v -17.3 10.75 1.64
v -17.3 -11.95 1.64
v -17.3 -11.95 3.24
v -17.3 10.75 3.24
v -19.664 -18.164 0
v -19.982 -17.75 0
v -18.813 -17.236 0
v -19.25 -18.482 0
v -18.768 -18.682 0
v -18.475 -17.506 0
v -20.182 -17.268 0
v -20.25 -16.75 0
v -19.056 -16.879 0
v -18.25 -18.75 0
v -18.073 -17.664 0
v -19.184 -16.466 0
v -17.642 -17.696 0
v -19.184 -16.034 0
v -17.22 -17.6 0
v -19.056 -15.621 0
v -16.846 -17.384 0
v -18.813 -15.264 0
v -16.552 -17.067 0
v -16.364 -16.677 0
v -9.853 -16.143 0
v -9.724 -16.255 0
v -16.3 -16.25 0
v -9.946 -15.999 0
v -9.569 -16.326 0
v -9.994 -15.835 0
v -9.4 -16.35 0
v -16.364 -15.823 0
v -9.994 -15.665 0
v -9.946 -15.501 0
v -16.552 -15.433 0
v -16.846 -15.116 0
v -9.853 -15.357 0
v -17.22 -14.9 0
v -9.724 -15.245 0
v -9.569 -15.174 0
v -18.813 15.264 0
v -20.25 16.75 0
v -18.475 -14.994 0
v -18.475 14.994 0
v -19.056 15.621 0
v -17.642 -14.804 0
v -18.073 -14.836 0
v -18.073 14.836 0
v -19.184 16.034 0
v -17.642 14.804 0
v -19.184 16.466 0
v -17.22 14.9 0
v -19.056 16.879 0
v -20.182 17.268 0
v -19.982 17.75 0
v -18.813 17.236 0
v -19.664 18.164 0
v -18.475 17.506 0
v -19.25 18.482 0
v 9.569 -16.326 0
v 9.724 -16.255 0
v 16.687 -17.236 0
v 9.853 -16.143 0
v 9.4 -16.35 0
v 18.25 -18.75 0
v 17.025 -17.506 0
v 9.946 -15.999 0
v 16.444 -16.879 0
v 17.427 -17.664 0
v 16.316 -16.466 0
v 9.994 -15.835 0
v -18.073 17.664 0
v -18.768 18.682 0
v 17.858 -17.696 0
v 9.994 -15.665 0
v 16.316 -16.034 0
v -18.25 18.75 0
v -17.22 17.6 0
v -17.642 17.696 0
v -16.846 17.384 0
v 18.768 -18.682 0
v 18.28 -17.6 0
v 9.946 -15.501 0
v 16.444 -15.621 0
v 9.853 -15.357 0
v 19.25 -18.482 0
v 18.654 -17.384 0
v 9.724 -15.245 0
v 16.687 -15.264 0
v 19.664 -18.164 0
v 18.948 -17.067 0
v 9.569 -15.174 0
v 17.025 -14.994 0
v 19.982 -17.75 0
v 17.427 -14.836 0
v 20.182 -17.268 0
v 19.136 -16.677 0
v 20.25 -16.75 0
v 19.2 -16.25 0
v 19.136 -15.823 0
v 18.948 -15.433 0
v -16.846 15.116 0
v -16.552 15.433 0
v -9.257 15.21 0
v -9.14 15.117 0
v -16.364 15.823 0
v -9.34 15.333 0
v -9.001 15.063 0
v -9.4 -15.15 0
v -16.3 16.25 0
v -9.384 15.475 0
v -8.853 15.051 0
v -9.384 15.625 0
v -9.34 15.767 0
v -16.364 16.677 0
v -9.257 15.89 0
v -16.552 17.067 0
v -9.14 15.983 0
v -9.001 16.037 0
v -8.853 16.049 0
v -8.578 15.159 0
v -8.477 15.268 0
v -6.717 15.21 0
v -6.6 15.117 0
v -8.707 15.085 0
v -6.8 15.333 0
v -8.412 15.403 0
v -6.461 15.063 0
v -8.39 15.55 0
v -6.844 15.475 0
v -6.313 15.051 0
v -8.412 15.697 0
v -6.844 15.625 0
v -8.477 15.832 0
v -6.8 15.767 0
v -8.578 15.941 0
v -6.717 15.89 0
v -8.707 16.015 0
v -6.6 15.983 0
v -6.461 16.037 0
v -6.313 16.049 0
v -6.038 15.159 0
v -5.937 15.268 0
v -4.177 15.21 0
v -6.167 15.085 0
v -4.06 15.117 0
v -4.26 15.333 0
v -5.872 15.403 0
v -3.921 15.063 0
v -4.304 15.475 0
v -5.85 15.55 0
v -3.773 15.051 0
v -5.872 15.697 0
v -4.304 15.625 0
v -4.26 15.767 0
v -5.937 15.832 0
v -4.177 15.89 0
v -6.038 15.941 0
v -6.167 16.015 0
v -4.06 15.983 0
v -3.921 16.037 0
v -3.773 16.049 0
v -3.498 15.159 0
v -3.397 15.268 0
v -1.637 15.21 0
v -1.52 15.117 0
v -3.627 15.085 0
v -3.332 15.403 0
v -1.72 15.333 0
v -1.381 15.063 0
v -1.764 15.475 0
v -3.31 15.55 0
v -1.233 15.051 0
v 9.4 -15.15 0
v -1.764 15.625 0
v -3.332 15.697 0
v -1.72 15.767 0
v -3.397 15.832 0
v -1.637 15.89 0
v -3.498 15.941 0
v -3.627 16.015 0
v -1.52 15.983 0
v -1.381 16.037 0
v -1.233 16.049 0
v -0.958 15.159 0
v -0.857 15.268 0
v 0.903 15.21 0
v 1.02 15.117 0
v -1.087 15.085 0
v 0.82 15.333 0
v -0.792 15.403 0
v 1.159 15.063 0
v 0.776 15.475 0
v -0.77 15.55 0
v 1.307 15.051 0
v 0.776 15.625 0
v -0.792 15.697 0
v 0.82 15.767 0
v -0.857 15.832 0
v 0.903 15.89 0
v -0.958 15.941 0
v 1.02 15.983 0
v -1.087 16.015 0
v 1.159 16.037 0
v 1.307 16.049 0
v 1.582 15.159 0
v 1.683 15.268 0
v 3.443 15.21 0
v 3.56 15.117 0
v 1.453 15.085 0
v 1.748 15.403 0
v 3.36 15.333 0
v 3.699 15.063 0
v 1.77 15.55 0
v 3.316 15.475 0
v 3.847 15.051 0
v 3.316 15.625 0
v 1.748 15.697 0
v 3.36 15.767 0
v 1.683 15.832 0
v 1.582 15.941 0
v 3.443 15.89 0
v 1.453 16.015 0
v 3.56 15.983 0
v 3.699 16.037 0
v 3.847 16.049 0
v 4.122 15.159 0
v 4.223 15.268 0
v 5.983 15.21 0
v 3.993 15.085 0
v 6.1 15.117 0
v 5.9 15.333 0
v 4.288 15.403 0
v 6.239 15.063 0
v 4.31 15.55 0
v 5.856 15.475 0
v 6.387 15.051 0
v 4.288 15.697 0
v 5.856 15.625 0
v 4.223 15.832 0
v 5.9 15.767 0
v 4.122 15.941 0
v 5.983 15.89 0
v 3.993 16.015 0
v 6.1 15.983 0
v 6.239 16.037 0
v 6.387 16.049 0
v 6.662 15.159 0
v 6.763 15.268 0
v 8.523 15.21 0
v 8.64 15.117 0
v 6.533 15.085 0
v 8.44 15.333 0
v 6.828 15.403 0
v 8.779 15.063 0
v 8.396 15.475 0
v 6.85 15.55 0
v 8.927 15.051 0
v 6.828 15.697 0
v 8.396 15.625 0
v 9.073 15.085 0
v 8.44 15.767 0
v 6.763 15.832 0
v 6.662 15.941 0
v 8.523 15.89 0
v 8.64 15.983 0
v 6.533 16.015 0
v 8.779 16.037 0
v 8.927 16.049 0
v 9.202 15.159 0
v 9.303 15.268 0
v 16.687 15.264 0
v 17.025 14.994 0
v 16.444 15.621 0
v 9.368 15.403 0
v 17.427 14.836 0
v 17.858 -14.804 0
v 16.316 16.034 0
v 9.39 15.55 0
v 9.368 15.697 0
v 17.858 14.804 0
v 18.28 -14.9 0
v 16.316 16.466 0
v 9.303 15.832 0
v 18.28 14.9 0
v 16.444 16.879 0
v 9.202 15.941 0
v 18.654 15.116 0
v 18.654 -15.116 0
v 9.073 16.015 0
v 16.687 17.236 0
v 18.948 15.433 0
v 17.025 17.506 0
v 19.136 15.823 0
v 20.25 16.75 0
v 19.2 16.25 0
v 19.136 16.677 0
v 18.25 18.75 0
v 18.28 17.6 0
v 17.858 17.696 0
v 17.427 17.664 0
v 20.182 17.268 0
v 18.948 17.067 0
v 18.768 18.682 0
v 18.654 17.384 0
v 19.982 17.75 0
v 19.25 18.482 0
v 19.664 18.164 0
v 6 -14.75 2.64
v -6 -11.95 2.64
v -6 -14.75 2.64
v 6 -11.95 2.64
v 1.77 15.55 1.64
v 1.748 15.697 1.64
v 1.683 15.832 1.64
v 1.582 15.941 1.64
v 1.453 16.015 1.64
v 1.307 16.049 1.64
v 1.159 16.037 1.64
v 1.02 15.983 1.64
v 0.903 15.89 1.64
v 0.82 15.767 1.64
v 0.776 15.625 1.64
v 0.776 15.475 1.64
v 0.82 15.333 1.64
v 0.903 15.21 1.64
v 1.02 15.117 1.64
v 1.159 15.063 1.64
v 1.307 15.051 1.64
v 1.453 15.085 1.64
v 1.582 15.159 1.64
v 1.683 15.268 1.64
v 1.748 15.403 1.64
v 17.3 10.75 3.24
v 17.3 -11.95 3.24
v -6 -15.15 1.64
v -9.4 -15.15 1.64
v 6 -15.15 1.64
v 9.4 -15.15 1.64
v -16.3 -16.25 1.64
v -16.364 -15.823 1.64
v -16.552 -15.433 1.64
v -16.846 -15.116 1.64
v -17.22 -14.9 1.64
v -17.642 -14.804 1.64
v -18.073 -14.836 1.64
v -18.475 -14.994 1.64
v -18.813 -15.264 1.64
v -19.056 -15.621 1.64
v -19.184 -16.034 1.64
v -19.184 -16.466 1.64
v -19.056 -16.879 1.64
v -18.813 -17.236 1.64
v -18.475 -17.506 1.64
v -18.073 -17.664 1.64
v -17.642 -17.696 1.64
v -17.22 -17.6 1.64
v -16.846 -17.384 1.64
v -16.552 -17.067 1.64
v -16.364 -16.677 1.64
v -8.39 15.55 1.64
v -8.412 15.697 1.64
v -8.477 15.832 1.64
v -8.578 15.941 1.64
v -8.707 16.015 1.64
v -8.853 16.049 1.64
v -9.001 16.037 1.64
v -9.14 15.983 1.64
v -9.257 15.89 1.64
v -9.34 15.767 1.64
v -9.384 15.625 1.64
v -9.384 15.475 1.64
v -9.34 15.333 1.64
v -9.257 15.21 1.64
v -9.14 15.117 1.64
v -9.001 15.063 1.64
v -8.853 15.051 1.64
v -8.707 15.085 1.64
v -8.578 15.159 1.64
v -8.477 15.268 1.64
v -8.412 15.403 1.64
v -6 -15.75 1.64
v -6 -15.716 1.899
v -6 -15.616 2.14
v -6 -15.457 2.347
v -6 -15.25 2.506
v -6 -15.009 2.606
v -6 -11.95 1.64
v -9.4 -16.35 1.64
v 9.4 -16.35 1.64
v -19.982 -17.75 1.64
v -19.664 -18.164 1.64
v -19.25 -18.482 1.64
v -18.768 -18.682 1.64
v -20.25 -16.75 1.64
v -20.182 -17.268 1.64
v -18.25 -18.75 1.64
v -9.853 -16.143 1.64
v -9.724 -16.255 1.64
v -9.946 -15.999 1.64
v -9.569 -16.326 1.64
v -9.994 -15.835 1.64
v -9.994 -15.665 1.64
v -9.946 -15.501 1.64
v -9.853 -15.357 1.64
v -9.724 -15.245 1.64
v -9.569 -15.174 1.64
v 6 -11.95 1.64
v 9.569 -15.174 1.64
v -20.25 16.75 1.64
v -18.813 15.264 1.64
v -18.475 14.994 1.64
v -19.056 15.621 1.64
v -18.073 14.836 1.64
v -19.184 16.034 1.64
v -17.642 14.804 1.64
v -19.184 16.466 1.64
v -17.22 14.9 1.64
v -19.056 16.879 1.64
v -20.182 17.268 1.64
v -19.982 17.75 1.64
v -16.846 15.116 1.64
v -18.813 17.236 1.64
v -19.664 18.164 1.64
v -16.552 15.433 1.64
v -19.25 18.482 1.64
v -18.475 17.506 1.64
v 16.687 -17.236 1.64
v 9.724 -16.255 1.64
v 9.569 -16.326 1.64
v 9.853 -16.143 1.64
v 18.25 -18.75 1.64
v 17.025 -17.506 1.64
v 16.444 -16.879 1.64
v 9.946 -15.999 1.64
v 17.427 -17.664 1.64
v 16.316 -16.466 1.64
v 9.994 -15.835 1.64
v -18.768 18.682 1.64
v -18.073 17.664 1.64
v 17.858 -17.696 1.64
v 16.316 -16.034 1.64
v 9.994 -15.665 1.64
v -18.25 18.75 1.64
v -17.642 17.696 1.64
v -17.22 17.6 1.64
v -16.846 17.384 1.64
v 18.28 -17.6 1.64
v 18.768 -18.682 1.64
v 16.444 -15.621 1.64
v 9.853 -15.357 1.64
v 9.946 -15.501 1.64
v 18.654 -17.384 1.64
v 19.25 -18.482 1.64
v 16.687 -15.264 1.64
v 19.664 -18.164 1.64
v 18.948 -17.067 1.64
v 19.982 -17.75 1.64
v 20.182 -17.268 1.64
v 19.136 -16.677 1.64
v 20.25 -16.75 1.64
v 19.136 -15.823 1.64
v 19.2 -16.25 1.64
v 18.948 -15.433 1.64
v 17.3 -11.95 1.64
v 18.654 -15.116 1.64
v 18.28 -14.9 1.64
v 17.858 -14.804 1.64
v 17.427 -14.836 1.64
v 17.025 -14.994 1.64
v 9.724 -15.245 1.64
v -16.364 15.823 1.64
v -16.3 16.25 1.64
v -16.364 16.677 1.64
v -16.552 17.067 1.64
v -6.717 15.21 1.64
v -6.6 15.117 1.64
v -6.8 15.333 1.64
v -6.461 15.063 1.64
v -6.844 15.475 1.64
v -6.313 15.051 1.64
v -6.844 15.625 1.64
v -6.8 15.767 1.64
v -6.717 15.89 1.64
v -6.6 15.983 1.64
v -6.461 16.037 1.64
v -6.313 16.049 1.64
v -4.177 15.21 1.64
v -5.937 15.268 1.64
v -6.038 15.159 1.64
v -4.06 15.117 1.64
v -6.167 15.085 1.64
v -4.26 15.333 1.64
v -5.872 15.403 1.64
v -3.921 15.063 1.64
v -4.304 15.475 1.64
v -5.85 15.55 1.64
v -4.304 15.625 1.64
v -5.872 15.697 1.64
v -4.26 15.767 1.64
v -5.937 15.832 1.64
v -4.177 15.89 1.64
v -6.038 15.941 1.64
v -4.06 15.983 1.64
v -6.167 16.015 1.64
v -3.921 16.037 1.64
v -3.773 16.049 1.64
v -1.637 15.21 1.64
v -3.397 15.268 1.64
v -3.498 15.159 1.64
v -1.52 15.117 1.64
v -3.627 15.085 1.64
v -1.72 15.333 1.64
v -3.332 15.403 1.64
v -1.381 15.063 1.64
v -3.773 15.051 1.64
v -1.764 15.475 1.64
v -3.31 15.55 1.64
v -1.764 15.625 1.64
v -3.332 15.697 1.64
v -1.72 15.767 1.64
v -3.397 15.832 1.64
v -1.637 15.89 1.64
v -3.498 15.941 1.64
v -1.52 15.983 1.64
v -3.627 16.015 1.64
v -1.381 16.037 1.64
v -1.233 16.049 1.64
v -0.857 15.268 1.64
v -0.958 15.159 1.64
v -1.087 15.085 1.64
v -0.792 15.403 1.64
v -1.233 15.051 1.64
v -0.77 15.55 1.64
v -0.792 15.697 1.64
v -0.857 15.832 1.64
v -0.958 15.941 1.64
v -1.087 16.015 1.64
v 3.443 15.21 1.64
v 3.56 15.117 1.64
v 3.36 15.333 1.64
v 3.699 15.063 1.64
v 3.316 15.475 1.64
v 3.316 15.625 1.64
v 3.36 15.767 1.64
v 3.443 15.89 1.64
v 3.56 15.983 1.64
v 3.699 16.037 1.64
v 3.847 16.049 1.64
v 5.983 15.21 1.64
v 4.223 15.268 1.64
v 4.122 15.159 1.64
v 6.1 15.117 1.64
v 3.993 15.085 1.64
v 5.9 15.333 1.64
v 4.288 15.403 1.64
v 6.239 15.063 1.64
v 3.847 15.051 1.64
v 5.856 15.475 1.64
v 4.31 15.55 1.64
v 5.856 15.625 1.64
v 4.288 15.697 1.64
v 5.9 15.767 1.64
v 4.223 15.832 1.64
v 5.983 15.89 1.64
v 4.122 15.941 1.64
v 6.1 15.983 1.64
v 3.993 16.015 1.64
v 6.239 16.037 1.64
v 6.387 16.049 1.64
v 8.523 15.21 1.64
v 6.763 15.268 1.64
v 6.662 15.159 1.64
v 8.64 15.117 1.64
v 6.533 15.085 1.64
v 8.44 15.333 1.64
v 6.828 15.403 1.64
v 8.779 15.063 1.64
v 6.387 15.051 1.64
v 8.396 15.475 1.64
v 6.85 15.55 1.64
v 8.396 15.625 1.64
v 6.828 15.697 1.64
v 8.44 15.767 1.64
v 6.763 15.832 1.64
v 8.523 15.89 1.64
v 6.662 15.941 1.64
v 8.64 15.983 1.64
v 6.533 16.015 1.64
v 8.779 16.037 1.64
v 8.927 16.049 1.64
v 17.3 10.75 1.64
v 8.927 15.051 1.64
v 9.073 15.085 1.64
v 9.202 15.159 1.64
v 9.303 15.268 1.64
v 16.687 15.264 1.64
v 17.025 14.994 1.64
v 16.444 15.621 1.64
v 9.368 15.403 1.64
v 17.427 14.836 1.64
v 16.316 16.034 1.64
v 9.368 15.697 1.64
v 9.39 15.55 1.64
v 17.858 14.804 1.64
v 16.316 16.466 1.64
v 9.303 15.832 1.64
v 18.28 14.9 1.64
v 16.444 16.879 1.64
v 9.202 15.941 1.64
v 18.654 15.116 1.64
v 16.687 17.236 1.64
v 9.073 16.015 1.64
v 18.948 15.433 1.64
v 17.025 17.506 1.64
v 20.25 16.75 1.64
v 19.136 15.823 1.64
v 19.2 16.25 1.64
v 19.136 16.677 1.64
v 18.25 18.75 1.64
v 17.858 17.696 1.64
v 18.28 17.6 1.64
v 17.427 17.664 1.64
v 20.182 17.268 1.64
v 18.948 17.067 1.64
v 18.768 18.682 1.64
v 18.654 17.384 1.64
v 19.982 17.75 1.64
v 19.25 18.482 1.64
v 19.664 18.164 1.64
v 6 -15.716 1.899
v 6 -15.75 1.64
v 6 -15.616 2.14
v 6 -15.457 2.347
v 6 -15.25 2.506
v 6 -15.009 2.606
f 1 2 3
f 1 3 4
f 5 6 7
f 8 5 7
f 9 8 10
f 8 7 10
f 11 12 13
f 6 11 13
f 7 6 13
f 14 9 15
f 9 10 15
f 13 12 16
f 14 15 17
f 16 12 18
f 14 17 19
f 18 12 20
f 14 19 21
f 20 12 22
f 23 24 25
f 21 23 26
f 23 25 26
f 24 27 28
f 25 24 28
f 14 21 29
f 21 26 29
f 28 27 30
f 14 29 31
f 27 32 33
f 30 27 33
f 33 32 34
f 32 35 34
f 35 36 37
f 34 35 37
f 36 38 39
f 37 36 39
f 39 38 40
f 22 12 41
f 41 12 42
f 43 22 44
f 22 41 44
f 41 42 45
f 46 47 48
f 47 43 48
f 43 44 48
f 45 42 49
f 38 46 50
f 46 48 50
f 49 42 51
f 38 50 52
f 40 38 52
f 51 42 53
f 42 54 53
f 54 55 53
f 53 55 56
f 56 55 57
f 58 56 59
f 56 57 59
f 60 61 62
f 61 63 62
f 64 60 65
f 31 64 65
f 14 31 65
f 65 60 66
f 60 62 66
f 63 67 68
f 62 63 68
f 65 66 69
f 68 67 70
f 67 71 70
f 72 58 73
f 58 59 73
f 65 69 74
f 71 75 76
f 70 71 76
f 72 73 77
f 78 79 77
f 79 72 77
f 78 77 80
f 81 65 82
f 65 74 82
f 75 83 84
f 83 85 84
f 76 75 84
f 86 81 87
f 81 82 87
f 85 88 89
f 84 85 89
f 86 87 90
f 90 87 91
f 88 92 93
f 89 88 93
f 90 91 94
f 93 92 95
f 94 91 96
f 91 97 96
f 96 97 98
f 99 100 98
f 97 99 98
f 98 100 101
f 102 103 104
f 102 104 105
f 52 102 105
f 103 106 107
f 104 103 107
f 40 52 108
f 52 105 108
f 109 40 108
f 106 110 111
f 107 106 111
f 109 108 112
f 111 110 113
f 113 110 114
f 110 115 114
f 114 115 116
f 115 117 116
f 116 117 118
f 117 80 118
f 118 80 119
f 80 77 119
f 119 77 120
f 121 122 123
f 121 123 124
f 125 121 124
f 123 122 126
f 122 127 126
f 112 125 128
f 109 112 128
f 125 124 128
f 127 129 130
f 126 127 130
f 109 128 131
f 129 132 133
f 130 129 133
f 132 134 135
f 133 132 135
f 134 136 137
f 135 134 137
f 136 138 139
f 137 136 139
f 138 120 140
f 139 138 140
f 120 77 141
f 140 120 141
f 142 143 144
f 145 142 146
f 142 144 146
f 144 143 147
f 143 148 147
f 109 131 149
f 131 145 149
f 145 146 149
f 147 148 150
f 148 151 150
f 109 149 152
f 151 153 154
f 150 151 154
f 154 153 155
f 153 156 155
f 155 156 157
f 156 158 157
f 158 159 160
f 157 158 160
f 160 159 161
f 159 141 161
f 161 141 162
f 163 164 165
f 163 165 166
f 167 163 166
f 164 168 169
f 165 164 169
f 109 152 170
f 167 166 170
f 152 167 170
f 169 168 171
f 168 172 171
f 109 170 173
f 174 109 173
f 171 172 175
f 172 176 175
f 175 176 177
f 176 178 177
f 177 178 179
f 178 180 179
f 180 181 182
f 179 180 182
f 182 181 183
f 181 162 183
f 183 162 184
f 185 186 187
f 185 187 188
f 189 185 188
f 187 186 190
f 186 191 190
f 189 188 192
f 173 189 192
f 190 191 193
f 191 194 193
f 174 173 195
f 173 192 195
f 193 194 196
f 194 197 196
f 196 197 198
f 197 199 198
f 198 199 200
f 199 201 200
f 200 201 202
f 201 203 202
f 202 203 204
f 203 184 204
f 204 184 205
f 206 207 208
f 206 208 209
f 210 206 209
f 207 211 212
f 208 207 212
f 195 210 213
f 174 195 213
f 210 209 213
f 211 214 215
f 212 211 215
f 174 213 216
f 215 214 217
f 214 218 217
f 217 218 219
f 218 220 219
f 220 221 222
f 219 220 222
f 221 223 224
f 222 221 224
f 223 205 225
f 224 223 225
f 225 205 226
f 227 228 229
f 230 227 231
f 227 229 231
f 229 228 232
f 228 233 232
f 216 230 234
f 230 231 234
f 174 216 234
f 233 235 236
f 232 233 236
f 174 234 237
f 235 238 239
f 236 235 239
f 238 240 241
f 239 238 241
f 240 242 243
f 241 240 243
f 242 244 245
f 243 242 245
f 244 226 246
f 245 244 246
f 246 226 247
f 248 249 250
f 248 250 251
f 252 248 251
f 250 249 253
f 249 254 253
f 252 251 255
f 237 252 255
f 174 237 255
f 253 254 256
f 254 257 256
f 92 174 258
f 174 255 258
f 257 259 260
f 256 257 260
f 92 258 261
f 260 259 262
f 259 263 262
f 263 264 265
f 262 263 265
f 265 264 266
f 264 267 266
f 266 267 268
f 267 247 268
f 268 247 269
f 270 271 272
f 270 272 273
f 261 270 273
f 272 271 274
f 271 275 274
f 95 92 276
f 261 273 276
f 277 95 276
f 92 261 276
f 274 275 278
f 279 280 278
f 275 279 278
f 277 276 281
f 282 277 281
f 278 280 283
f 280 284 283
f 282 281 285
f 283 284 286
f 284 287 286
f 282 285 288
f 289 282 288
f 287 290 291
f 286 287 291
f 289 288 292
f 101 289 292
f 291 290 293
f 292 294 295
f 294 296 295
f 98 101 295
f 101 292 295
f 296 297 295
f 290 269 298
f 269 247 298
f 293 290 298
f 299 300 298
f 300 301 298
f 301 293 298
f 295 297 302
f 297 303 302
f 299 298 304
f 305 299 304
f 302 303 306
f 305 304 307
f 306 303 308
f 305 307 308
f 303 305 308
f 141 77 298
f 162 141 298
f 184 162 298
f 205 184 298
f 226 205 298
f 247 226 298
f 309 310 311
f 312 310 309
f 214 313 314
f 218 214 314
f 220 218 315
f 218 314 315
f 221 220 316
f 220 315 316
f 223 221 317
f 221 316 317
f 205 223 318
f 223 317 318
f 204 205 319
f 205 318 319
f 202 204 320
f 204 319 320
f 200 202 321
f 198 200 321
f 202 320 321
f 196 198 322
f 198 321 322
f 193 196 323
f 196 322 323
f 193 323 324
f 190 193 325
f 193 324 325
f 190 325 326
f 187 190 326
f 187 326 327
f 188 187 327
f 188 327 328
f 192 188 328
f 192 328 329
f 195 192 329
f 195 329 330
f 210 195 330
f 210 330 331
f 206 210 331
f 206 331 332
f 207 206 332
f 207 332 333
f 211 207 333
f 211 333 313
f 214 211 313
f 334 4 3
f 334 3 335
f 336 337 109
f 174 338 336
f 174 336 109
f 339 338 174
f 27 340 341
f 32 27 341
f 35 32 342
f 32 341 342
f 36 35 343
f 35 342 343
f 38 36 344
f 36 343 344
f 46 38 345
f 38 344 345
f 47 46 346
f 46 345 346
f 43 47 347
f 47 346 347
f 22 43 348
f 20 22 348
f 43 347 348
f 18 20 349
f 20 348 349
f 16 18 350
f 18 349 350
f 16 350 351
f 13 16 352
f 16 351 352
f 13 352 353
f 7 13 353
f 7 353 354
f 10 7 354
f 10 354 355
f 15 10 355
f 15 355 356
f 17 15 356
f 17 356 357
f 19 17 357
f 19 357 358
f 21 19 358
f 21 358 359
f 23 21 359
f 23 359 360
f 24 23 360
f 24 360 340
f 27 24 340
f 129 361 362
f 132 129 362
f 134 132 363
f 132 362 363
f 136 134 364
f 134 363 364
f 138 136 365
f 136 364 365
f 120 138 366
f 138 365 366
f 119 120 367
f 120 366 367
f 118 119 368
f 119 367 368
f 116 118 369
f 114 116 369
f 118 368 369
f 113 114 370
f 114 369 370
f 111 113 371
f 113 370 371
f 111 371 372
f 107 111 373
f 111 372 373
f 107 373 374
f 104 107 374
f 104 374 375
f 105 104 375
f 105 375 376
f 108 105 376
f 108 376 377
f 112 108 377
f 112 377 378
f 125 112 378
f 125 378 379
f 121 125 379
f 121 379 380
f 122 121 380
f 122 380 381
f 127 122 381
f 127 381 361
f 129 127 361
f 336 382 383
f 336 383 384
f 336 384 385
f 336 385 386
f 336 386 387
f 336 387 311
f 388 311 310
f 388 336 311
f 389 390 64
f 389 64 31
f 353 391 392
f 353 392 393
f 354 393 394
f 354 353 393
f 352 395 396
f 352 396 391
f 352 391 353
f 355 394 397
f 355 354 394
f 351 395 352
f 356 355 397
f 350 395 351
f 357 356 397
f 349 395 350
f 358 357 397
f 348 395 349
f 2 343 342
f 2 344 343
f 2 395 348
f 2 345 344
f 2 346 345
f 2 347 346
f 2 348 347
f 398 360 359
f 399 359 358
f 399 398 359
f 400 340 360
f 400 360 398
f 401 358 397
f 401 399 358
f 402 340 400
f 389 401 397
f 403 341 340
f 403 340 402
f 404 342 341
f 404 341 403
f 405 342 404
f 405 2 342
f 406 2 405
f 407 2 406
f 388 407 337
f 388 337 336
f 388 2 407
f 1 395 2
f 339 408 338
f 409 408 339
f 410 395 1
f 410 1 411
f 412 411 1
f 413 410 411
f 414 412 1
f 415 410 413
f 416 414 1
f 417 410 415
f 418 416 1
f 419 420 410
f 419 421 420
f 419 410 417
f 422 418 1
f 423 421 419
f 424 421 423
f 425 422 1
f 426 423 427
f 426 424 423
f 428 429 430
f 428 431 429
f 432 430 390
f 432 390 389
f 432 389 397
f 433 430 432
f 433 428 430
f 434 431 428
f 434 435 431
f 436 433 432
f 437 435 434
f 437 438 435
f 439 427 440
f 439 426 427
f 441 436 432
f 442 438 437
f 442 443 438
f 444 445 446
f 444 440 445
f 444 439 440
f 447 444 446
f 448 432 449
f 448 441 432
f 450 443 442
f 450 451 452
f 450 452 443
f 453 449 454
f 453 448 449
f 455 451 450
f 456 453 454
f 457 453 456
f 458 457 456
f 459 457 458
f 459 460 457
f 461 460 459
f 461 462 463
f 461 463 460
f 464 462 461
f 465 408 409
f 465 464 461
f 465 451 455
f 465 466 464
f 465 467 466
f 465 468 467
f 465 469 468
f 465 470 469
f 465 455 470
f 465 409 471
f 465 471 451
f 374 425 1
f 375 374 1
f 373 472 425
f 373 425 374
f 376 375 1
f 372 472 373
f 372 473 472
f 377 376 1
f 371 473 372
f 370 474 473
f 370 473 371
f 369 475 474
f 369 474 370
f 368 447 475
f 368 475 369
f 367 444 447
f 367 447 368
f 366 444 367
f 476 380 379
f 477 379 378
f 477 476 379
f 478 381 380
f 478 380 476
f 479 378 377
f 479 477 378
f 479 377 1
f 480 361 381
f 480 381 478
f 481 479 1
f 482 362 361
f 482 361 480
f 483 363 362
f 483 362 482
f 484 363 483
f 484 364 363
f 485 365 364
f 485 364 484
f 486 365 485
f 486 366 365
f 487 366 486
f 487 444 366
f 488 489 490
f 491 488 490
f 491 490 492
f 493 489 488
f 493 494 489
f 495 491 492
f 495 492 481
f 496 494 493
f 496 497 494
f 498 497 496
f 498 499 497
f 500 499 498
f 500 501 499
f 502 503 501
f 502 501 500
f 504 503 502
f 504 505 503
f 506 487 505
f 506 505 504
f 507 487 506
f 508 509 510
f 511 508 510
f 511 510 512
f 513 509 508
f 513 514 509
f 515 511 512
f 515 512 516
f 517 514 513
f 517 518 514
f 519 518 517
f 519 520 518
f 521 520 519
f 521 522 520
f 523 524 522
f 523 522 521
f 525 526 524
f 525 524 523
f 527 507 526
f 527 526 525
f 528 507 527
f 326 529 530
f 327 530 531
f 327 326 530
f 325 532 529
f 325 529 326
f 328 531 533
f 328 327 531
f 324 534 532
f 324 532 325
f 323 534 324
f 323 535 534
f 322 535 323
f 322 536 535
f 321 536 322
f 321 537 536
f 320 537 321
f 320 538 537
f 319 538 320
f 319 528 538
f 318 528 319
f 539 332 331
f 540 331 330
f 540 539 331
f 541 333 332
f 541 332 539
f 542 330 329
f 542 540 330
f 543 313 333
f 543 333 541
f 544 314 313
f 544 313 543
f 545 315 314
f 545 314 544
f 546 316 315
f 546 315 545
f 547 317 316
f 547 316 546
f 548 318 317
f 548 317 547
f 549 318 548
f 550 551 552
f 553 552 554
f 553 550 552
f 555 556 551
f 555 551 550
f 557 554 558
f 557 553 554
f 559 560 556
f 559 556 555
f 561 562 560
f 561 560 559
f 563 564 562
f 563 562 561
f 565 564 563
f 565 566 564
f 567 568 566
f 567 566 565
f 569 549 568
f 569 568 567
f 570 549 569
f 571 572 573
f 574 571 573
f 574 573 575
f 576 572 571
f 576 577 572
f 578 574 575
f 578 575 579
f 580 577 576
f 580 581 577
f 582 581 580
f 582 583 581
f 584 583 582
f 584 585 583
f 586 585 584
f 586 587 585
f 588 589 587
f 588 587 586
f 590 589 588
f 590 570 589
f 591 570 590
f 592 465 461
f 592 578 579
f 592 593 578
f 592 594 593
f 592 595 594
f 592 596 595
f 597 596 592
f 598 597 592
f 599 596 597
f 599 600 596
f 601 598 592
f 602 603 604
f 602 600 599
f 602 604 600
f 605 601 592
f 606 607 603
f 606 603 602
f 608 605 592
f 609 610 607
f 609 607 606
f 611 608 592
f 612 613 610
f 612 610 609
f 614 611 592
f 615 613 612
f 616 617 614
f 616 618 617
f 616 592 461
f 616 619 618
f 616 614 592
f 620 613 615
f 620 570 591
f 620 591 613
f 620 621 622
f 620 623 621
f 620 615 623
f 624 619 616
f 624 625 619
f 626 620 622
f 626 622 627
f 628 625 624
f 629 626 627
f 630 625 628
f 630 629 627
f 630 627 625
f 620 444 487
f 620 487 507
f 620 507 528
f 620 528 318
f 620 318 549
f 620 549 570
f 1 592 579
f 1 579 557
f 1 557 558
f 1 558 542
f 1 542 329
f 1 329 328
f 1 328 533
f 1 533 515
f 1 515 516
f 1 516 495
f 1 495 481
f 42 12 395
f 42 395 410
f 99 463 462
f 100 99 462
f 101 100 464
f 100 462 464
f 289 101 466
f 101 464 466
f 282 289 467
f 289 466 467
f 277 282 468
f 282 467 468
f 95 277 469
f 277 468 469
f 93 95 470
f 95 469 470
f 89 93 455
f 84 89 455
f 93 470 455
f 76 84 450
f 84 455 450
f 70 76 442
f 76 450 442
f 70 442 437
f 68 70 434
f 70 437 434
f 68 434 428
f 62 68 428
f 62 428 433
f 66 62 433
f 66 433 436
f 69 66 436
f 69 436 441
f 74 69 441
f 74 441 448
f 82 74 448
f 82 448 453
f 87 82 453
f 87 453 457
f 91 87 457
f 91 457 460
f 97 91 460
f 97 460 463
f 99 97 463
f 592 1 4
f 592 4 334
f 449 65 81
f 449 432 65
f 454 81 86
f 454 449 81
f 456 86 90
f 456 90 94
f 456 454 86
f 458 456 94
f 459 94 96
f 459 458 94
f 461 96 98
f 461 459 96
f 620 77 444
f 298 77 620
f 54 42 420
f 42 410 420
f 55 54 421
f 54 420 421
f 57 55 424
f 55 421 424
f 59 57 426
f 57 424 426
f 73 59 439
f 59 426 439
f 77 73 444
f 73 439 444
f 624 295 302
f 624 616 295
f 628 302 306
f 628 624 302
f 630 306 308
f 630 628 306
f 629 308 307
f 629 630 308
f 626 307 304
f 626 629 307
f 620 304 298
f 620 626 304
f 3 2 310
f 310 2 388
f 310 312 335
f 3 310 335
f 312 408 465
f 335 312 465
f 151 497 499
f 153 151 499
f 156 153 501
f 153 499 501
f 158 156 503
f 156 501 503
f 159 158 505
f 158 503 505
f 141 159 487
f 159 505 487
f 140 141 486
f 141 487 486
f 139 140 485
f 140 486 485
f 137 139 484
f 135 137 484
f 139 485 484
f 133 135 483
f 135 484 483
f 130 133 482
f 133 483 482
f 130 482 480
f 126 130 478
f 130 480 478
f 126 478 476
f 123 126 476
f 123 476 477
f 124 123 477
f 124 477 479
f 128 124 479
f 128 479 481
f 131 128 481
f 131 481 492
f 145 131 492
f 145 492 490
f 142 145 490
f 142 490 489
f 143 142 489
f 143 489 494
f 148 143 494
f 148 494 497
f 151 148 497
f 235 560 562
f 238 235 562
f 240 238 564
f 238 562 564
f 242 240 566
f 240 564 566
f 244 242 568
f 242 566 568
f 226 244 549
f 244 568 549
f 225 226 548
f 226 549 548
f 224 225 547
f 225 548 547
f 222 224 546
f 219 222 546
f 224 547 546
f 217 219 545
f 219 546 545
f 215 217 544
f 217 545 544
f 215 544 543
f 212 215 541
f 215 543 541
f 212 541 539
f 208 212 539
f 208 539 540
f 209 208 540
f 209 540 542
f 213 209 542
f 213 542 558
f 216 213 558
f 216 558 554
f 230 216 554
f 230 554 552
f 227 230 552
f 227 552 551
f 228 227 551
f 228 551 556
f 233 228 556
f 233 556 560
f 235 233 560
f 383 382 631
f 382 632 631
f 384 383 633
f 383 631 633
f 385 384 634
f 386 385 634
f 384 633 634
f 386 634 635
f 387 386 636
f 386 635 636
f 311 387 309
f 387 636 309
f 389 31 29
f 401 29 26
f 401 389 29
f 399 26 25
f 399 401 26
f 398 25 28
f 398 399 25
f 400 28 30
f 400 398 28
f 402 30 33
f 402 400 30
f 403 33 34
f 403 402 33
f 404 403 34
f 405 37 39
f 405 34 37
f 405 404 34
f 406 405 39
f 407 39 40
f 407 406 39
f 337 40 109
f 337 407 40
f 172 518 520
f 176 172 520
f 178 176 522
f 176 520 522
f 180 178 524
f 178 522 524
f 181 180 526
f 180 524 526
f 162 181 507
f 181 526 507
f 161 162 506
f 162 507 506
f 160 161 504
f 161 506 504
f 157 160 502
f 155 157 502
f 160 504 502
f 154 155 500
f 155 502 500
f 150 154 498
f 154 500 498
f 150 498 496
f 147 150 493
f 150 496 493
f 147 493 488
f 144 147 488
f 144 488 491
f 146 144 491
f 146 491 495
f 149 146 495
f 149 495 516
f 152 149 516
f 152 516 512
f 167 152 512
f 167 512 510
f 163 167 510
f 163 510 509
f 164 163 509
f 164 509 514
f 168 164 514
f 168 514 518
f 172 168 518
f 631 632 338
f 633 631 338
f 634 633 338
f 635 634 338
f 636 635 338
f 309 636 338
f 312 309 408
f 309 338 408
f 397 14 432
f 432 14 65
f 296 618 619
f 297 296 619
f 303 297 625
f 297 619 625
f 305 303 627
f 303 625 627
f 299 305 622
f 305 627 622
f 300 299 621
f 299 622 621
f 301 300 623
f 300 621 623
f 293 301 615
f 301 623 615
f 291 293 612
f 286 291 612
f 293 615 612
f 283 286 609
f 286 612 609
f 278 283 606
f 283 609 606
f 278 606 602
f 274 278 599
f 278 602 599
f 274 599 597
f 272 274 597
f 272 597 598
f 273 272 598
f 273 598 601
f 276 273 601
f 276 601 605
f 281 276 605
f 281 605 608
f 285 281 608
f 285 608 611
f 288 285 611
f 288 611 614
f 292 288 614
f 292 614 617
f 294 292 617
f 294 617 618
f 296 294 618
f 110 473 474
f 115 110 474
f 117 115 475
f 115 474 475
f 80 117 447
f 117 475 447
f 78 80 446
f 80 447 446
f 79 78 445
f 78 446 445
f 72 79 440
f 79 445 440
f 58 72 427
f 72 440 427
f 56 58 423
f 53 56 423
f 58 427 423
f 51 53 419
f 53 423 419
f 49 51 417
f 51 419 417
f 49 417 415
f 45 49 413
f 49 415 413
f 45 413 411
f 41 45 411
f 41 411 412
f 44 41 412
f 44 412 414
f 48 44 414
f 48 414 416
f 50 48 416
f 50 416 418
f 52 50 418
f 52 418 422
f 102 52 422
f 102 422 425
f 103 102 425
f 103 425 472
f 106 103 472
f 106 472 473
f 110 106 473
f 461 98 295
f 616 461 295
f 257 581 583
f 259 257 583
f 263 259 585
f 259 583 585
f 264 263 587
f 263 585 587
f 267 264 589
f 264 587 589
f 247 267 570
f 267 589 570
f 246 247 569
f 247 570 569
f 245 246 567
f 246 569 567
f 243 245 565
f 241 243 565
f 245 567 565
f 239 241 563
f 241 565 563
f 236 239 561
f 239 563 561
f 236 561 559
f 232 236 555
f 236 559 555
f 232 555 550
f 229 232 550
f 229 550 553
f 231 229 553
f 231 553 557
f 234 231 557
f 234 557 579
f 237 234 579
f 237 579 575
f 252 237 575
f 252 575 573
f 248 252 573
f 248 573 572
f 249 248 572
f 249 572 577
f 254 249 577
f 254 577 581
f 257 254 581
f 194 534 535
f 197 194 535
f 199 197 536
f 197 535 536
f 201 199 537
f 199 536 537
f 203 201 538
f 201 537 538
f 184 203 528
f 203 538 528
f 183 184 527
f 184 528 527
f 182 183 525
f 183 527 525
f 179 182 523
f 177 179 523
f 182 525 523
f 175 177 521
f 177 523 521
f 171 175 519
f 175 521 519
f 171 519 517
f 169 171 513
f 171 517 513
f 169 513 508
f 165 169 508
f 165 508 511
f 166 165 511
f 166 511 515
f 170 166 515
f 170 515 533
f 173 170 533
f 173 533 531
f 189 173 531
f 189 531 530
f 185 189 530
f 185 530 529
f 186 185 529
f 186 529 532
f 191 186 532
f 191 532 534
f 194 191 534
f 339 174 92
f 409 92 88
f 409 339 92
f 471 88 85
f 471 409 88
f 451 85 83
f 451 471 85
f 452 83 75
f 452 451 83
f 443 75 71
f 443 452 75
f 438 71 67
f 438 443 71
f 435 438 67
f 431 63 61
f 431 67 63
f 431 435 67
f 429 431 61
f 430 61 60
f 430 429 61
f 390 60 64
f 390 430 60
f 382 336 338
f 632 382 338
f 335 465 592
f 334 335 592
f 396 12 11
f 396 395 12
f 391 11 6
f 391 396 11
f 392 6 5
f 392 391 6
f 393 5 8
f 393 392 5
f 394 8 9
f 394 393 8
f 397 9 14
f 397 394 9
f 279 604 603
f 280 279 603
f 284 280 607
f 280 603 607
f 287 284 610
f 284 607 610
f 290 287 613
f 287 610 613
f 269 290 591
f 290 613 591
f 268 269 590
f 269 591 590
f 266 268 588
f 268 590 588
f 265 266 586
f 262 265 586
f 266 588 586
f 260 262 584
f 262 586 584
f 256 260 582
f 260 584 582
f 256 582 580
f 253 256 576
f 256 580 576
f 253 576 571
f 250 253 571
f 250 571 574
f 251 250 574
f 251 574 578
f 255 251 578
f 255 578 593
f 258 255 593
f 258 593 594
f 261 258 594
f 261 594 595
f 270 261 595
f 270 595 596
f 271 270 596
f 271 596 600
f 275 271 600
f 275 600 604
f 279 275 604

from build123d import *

# Parameters (mm, degrees)
SKETCH1_W           = 40.5
SKETCH1_H           = 37.5
PCB_DEPTH           = 1.64
FILLET1_R           = 2
MOUNT_HOLE_REACH    = 29.646
SKETCH2_R           = 1.45
SLOT_REACH          = 29.646
CUT_EXTRUDE3_REACH  = 29.646
SKETCH4_R           = 0.5
SKETCH5_W           = 34.6
SKETCH5_H           = 22.7
OLED_GLASS_DEPTH    = 1.6
SKETCH6_W           = 12
SKETCH6_H           = 3.8
BOSS_EXTRUDE3_DEPTH = 1
FILLET2_R           = 1


with BuildPart() as part:
    # Sketch1 → PCB (new body)
    with BuildSketch(Plane.XY):
        Rectangle(SKETCH1_W, SKETCH1_H)
    extrude(amount=PCB_DEPTH)

    # Fillet1
    fillet1_edges = [part.edges().sort_by_distance(p)[0] for p in [
        (-20.25, 18.75, 0.82),
        (20.25, 18.75, 0.82),
        (20.25, -18.75, 0.82),
        (-20.25, -18.75, 0.82),
    ]]
    fillet(fillet1_edges, radius=FILLET1_R)

    # Sketch2 → mount hole (cut, up to next)
    with BuildSketch(Plane.XY.offset(1.64), mode=Mode.PRIVATE) as mount_hole_sk1:
        with Locations((-17.75, 16.25)):
            Circle(SKETCH2_R)
    mount_hole_tool1 = extrude(mount_hole_sk1.sketch, amount=-MOUNT_HOLE_REACH, mode=Mode.PRIVATE) & part.part
    # Sketch2 → mount hole (cut, up to next)
    with BuildSketch(Plane.XY.offset(1.64), mode=Mode.PRIVATE) as mount_hole_sk2:
        with Locations((17.75, 16.25)):
            Circle(SKETCH2_R)
    mount_hole_tool2 = extrude(mount_hole_sk2.sketch, amount=-MOUNT_HOLE_REACH, mode=Mode.PRIVATE) & part.part
    # Sketch2 → mount hole (cut, up to next)
    with BuildSketch(Plane.XY.offset(1.64), mode=Mode.PRIVATE) as mount_hole_sk3:
        with Locations((17.75, -16.25)):
            Circle(SKETCH2_R)
    mount_hole_tool3 = extrude(mount_hole_sk3.sketch, amount=-MOUNT_HOLE_REACH, mode=Mode.PRIVATE) & part.part
    # Sketch2 → mount hole (cut, up to next)
    with BuildSketch(Plane.XY.offset(1.64), mode=Mode.PRIVATE) as mount_hole_sk4:
        with Locations((-17.75, -16.25)):
            Circle(SKETCH2_R)
    mount_hole_tool4 = extrude(mount_hole_sk4.sketch, amount=-MOUNT_HOLE_REACH, mode=Mode.PRIVATE) & part.part
    add(mount_hole_tool1.solids().sort_by_distance((-17.75, 16.25, 1.64))[0], mode=Mode.SUBTRACT)
    add(mount_hole_tool2.solids().sort_by_distance((17.75, 16.25, 1.64))[0], mode=Mode.SUBTRACT)
    add(mount_hole_tool3.solids().sort_by_distance((17.75, -16.25, 1.64))[0], mode=Mode.SUBTRACT)
    add(mount_hole_tool4.solids().sort_by_distance((-17.75, -16.25, 1.64))[0], mode=Mode.SUBTRACT)

    # Sketch3 → slot (cut, up to next)
    with BuildSketch(Plane.XY.offset(1.64), mode=Mode.PRIVATE) as slot_sk1:
        with BuildLine():
            Line((-9.4, -15.15), (9.4, -15.15))
            ThreePointArc((9.4, -15.15), (10, -15.75), (9.4, -16.35))
            Line((9.4, -16.35), (-9.4, -16.35))
            ThreePointArc((-9.4, -16.35), (-10, -15.75), (-9.4, -15.15))
        make_face()
    slot_tool1 = extrude(slot_sk1.sketch, amount=-SLOT_REACH, mode=Mode.PRIVATE) & part.part
    add(slot_tool1.solids().sort_by_distance((0, -15.75, 1.64))[0], mode=Mode.SUBTRACT)

    # Sketch4 → Cut-Extrude3 (cut, up to next)
    with BuildSketch(Plane.XY.offset(1.64), mode=Mode.PRIVATE) as cut_extrude3_sk1:
        with Locations((-8.89, 15.55)):
            Circle(SKETCH4_R)
    cut_extrude3_tool1 = extrude(cut_extrude3_sk1.sketch, amount=-CUT_EXTRUDE3_REACH, mode=Mode.PRIVATE) & part.part
    # Sketch4 → Cut-Extrude3 (cut, up to next)
    with BuildSketch(Plane.XY.offset(1.64), mode=Mode.PRIVATE) as cut_extrude3_sk2:
        with Locations((-6.35, 15.55)):
            Circle(SKETCH4_R)
    cut_extrude3_tool2 = extrude(cut_extrude3_sk2.sketch, amount=-CUT_EXTRUDE3_REACH, mode=Mode.PRIVATE) & part.part
    # Sketch4 → Cut-Extrude3 (cut, up to next)
    with BuildSketch(Plane.XY.offset(1.64), mode=Mode.PRIVATE) as cut_extrude3_sk3:
        with Locations((-3.81, 15.55)):
            Circle(SKETCH4_R)
    cut_extrude3_tool3 = extrude(cut_extrude3_sk3.sketch, amount=-CUT_EXTRUDE3_REACH, mode=Mode.PRIVATE) & part.part
    # Sketch4 → Cut-Extrude3 (cut, up to next)
    with BuildSketch(Plane.XY.offset(1.64), mode=Mode.PRIVATE) as cut_extrude3_sk4:
        with Locations((-1.27, 15.55)):
            Circle(SKETCH4_R)
    cut_extrude3_tool4 = extrude(cut_extrude3_sk4.sketch, amount=-CUT_EXTRUDE3_REACH, mode=Mode.PRIVATE) & part.part
    # Sketch4 → Cut-Extrude3 (cut, up to next)
    with BuildSketch(Plane.XY.offset(1.64), mode=Mode.PRIVATE) as cut_extrude3_sk5:
        with Locations((1.27, 15.55)):
            Circle(SKETCH4_R)
    cut_extrude3_tool5 = extrude(cut_extrude3_sk5.sketch, amount=-CUT_EXTRUDE3_REACH, mode=Mode.PRIVATE) & part.part
    # Sketch4 → Cut-Extrude3 (cut, up to next)
    with BuildSketch(Plane.XY.offset(1.64), mode=Mode.PRIVATE) as cut_extrude3_sk6:
        with Locations((3.81, 15.55)):
            Circle(SKETCH4_R)
    cut_extrude3_tool6 = extrude(cut_extrude3_sk6.sketch, amount=-CUT_EXTRUDE3_REACH, mode=Mode.PRIVATE) & part.part
    # Sketch4 → Cut-Extrude3 (cut, up to next)
    with BuildSketch(Plane.XY.offset(1.64), mode=Mode.PRIVATE) as cut_extrude3_sk7:
        with Locations((6.35, 15.55)):
            Circle(SKETCH4_R)
    cut_extrude3_tool7 = extrude(cut_extrude3_sk7.sketch, amount=-CUT_EXTRUDE3_REACH, mode=Mode.PRIVATE) & part.part
    # Sketch4 → Cut-Extrude3 (cut, up to next)
    with BuildSketch(Plane.XY.offset(1.64), mode=Mode.PRIVATE) as cut_extrude3_sk8:
        with Locations((8.89, 15.55)):
            Circle(SKETCH4_R)
    cut_extrude3_tool8 = extrude(cut_extrude3_sk8.sketch, amount=-CUT_EXTRUDE3_REACH, mode=Mode.PRIVATE) & part.part
    add(cut_extrude3_tool1.solids().sort_by_distance((-8.89, 15.55, 1.64))[0], mode=Mode.SUBTRACT)
    add(cut_extrude3_tool2.solids().sort_by_distance((-6.35, 15.55, 1.64))[0], mode=Mode.SUBTRACT)
    add(cut_extrude3_tool3.solids().sort_by_distance((-3.81, 15.55, 1.64))[0], mode=Mode.SUBTRACT)
    add(cut_extrude3_tool4.solids().sort_by_distance((-1.27, 15.55, 1.64))[0], mode=Mode.SUBTRACT)
    add(cut_extrude3_tool5.solids().sort_by_distance((1.27, 15.55, 1.64))[0], mode=Mode.SUBTRACT)
    add(cut_extrude3_tool6.solids().sort_by_distance((3.81, 15.55, 1.64))[0], mode=Mode.SUBTRACT)
    add(cut_extrude3_tool7.solids().sort_by_distance((6.35, 15.55, 1.64))[0], mode=Mode.SUBTRACT)
    add(cut_extrude3_tool8.solids().sort_by_distance((8.89, 15.55, 1.64))[0], mode=Mode.SUBTRACT)

    # Sketch5 → OLED glass (add)
    with BuildSketch(Plane.XY.offset(1.64)):
        with Locations((0, -0.6)):
            Rectangle(SKETCH5_W, SKETCH5_H)
    extrude(amount=OLED_GLASS_DEPTH)

    # Sketch6 → Boss-Extrude3 (add)
    with BuildSketch(Plane.XY.offset(1.64)):
        with Locations((0, -13.85)):
            Rectangle(SKETCH6_W, SKETCH6_H)
    extrude(amount=BOSS_EXTRUDE3_DEPTH)

    # Fillet2
    fillet2_edges = [part.edges().sort_by_distance(p)[0] for p in [
        (0, -15.75, 2.64),
    ]]
    fillet(fillet2_edges, radius=FILLET2_R - 0.0001)  # a hair under: the kernel refuses the full size


solid = part.part
